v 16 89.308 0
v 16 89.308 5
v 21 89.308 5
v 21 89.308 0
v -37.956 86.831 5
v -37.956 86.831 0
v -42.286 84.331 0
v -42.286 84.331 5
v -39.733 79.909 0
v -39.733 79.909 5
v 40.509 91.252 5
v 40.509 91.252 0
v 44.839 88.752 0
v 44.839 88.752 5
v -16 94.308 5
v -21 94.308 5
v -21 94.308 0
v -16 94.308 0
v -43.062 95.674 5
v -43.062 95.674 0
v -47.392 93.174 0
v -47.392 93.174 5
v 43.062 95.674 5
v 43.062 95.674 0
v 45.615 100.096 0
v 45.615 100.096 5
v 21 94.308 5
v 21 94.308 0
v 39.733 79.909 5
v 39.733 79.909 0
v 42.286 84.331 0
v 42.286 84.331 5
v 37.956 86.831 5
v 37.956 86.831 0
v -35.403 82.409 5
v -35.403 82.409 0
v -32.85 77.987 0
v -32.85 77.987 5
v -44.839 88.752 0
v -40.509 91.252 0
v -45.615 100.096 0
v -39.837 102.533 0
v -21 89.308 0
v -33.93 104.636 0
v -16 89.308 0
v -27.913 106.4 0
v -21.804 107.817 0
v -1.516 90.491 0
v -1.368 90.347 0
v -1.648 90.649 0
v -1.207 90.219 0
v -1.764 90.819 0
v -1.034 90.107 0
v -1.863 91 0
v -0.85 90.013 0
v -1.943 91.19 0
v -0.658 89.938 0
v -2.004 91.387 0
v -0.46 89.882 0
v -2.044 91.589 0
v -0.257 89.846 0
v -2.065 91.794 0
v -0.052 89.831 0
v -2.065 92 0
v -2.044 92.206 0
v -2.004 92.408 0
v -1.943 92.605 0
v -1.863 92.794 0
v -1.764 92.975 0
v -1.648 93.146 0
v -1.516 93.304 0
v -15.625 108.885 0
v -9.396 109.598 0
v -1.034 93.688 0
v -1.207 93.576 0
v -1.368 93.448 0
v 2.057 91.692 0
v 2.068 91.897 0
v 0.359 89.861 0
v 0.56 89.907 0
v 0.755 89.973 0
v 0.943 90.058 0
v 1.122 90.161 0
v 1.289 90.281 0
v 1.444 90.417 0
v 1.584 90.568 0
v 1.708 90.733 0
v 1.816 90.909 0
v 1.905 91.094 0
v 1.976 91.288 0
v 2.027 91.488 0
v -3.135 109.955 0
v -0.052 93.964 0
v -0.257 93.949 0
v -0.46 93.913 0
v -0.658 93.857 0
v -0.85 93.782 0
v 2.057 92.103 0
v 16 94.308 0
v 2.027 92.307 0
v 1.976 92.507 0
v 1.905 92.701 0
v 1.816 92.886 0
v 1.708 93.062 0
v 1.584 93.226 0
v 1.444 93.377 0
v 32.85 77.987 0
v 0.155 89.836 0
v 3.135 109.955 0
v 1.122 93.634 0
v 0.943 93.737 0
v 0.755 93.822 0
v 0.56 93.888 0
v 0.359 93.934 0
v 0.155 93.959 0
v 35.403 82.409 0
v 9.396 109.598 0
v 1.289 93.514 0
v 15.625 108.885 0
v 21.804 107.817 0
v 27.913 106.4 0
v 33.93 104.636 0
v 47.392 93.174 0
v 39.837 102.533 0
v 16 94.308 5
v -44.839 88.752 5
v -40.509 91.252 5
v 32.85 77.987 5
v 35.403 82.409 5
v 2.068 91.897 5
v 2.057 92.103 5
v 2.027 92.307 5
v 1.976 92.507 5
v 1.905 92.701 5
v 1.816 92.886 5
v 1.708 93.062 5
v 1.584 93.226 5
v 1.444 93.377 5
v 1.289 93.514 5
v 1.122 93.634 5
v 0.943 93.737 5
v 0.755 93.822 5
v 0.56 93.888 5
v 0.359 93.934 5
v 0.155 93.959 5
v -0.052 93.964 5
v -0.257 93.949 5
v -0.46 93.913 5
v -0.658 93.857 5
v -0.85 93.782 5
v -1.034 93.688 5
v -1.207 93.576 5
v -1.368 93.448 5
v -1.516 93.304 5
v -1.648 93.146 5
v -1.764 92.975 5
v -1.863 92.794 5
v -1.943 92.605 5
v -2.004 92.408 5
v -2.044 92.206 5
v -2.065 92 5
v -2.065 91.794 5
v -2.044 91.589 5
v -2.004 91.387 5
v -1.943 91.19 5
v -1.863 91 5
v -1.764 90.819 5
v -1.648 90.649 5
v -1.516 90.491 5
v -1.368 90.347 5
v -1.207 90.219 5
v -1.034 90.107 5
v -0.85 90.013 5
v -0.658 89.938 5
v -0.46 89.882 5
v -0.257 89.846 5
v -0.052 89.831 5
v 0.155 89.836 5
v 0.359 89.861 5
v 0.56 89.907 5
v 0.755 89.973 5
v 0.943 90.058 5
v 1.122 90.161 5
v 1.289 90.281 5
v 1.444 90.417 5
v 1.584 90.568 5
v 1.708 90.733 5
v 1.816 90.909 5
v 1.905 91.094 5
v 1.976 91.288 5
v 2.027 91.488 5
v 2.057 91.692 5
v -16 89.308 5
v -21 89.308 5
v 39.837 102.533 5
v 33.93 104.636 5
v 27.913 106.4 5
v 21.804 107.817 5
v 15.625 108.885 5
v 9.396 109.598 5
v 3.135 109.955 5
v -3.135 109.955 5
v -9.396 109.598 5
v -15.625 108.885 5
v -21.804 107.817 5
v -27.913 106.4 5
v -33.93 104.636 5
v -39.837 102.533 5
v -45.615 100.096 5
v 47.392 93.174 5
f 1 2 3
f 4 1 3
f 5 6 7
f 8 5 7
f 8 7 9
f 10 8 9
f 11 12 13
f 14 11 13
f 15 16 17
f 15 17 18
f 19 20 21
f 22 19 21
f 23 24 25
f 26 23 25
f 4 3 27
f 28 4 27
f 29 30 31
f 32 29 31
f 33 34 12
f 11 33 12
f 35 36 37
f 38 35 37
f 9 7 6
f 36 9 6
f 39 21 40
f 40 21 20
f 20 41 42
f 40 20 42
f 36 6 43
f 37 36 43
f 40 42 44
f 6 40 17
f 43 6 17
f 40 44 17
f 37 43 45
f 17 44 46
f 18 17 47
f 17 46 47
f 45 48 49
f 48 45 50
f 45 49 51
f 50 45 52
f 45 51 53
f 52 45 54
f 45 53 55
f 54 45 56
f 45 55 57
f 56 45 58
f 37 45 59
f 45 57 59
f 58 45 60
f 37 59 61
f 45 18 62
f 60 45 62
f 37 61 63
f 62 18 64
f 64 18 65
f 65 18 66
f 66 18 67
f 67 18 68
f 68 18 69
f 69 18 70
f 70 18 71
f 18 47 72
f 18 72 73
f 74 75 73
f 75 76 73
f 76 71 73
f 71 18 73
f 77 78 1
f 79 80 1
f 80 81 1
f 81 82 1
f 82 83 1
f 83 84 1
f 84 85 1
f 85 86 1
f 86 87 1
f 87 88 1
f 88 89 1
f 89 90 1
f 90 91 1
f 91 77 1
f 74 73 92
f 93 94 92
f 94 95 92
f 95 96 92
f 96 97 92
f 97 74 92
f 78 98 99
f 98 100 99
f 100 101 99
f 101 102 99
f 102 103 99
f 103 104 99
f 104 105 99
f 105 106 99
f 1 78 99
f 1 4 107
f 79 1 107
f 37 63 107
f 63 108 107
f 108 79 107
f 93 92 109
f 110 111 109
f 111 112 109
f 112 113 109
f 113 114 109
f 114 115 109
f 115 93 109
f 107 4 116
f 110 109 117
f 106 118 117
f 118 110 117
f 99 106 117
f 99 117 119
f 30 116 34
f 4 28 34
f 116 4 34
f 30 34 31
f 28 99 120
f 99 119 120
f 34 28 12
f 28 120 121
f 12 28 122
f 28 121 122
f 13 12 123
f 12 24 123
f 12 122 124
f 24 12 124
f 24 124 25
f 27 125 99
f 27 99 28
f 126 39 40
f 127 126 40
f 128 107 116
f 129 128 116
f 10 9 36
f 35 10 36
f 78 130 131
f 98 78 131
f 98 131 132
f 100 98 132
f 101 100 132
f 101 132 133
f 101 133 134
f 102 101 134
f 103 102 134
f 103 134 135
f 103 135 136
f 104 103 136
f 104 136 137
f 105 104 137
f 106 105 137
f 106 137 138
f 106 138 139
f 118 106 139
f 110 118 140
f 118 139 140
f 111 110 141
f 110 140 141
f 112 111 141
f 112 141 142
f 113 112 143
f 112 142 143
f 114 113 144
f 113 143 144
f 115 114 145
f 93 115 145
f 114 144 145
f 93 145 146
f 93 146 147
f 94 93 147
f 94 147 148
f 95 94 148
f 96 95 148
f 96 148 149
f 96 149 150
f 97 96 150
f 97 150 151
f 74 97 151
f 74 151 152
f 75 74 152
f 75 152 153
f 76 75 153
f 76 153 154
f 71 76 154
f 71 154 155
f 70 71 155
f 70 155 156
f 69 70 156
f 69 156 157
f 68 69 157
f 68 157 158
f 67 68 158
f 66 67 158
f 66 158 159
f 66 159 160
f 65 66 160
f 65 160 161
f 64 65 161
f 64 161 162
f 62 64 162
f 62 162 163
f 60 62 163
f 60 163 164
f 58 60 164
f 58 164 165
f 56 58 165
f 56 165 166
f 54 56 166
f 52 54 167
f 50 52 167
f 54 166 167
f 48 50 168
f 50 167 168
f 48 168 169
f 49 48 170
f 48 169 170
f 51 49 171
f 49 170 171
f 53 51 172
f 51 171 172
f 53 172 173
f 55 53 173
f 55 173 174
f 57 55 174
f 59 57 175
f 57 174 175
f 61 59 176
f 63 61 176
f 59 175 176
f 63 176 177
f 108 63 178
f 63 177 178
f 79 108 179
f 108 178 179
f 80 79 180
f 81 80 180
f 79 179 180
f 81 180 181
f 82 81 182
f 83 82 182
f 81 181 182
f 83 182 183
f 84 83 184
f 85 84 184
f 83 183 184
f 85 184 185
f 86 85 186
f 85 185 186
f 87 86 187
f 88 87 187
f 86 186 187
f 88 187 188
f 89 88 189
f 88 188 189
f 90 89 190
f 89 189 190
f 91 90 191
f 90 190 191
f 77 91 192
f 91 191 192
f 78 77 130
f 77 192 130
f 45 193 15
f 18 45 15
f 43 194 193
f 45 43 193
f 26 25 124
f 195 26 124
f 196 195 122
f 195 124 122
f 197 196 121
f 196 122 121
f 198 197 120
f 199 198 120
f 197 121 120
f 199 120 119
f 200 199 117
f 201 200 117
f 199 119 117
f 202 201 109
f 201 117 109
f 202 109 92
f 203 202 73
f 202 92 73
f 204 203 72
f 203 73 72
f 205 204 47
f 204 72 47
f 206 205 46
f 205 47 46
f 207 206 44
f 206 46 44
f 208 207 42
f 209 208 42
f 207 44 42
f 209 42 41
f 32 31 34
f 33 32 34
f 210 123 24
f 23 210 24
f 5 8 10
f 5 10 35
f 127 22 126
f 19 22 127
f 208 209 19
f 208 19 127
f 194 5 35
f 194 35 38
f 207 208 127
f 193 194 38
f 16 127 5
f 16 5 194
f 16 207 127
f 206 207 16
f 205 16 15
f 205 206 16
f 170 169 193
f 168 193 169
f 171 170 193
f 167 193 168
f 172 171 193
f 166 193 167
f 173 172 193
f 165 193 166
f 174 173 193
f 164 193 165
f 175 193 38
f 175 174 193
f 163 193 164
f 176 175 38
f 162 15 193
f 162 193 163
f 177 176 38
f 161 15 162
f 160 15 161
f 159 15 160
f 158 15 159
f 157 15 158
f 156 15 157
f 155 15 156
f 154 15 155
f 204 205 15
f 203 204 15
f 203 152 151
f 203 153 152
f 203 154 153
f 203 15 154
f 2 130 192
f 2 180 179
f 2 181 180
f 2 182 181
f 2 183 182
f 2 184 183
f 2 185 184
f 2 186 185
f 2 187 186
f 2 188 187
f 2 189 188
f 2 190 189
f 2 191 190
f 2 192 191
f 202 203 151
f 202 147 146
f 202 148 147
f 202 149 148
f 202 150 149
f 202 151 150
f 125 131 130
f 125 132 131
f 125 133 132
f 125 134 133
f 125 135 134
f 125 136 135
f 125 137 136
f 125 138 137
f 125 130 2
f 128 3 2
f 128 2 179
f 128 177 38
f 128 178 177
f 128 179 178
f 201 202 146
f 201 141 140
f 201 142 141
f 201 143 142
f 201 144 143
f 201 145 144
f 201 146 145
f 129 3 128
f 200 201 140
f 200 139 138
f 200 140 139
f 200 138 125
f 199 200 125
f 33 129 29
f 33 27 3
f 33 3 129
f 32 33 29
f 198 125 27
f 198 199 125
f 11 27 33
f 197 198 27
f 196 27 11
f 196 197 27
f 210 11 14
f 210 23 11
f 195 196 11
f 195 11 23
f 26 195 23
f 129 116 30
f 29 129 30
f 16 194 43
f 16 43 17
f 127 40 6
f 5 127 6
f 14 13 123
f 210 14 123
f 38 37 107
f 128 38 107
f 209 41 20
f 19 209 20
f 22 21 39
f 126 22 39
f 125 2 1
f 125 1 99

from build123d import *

# Parameters (mm, degrees)
BOSS_EXTRUDE1_DEPTH = 5
SKETCH2_R           = 2.0675
SKETCH2_W           = 5
SKETCH2_H           = 5
CUT_EXTRUDE1_DEPTH  = 6


with BuildPart() as part:
    # Sketch1 → Boss-Extrude1 (new body)
    with BuildSketch(Plane.XY):
        with BuildLine():
            Line((-32.85, 77.986683936), (32.85, 77.986683936))
            Line((32.85, 77.986683936), (35.403, 82.408609648))
            Line((35.403, 82.408609648), (39.733127019, 79.908609648))
            Line((39.733127019, 79.908609648), (42.286127019, 84.330535359))
            Line((42.286127019, 84.330535359), (37.956, 86.830535359))
            Line((37.956, 86.830535359), (40.509, 91.252461071))
            Line((40.509, 91.252461071), (44.839127019, 88.752461071))
            Line((44.839127019, 88.752461071), (47.392127019, 93.174386783))
            Line((47.392127019, 93.174386783), (43.062, 95.674386783))
            Line((43.062, 95.674386783), (45.615, 100.096312495))
            ThreePointArc((45.615, 100.096312495), (0, 110), (-45.615, 100.096312495))
            Line((-45.615, 100.096312495), (-43.062, 95.674386783))
            Line((-43.062, 95.674386783), (-47.392127019, 93.174386783))
            Line((-47.392127019, 93.174386783), (-44.839127019, 88.752461071))
            Line((-44.839127019, 88.752461071), (-40.509, 91.252461071))
            Line((-40.509, 91.252461071), (-37.956, 86.830535359))
            Line((-37.956, 86.830535359), (-42.286127019, 84.330535359))
            Line((-42.286127019, 84.330535359), (-39.733127019, 79.908609648))
            Line((-39.733127019, 79.908609648), (-35.403, 82.408609648))
            Line((-35.403, 82.408609648), (-32.85, 77.986683936))
        make_face()
    extrude(amount=BOSS_EXTRUDE1_DEPTH)

    # Sketch2 → Cut-Extrude1 (cut, through all)
    with BuildSketch(Plane.XY.offset(5)):
        with Locations((0, 91.897414387)):
            Circle(SKETCH2_R)
        with Locations((18.5, 91.807821113)):
            Rectangle(SKETCH2_W, SKETCH2_H)
        with Locations((-18.5, 91.807821113)):
            Rectangle(SKETCH2_W, SKETCH2_H)
    extrude(amount=-CUT_EXTRUDE1_DEPTH, mode=Mode.SUBTRACT)


solid = part.part
